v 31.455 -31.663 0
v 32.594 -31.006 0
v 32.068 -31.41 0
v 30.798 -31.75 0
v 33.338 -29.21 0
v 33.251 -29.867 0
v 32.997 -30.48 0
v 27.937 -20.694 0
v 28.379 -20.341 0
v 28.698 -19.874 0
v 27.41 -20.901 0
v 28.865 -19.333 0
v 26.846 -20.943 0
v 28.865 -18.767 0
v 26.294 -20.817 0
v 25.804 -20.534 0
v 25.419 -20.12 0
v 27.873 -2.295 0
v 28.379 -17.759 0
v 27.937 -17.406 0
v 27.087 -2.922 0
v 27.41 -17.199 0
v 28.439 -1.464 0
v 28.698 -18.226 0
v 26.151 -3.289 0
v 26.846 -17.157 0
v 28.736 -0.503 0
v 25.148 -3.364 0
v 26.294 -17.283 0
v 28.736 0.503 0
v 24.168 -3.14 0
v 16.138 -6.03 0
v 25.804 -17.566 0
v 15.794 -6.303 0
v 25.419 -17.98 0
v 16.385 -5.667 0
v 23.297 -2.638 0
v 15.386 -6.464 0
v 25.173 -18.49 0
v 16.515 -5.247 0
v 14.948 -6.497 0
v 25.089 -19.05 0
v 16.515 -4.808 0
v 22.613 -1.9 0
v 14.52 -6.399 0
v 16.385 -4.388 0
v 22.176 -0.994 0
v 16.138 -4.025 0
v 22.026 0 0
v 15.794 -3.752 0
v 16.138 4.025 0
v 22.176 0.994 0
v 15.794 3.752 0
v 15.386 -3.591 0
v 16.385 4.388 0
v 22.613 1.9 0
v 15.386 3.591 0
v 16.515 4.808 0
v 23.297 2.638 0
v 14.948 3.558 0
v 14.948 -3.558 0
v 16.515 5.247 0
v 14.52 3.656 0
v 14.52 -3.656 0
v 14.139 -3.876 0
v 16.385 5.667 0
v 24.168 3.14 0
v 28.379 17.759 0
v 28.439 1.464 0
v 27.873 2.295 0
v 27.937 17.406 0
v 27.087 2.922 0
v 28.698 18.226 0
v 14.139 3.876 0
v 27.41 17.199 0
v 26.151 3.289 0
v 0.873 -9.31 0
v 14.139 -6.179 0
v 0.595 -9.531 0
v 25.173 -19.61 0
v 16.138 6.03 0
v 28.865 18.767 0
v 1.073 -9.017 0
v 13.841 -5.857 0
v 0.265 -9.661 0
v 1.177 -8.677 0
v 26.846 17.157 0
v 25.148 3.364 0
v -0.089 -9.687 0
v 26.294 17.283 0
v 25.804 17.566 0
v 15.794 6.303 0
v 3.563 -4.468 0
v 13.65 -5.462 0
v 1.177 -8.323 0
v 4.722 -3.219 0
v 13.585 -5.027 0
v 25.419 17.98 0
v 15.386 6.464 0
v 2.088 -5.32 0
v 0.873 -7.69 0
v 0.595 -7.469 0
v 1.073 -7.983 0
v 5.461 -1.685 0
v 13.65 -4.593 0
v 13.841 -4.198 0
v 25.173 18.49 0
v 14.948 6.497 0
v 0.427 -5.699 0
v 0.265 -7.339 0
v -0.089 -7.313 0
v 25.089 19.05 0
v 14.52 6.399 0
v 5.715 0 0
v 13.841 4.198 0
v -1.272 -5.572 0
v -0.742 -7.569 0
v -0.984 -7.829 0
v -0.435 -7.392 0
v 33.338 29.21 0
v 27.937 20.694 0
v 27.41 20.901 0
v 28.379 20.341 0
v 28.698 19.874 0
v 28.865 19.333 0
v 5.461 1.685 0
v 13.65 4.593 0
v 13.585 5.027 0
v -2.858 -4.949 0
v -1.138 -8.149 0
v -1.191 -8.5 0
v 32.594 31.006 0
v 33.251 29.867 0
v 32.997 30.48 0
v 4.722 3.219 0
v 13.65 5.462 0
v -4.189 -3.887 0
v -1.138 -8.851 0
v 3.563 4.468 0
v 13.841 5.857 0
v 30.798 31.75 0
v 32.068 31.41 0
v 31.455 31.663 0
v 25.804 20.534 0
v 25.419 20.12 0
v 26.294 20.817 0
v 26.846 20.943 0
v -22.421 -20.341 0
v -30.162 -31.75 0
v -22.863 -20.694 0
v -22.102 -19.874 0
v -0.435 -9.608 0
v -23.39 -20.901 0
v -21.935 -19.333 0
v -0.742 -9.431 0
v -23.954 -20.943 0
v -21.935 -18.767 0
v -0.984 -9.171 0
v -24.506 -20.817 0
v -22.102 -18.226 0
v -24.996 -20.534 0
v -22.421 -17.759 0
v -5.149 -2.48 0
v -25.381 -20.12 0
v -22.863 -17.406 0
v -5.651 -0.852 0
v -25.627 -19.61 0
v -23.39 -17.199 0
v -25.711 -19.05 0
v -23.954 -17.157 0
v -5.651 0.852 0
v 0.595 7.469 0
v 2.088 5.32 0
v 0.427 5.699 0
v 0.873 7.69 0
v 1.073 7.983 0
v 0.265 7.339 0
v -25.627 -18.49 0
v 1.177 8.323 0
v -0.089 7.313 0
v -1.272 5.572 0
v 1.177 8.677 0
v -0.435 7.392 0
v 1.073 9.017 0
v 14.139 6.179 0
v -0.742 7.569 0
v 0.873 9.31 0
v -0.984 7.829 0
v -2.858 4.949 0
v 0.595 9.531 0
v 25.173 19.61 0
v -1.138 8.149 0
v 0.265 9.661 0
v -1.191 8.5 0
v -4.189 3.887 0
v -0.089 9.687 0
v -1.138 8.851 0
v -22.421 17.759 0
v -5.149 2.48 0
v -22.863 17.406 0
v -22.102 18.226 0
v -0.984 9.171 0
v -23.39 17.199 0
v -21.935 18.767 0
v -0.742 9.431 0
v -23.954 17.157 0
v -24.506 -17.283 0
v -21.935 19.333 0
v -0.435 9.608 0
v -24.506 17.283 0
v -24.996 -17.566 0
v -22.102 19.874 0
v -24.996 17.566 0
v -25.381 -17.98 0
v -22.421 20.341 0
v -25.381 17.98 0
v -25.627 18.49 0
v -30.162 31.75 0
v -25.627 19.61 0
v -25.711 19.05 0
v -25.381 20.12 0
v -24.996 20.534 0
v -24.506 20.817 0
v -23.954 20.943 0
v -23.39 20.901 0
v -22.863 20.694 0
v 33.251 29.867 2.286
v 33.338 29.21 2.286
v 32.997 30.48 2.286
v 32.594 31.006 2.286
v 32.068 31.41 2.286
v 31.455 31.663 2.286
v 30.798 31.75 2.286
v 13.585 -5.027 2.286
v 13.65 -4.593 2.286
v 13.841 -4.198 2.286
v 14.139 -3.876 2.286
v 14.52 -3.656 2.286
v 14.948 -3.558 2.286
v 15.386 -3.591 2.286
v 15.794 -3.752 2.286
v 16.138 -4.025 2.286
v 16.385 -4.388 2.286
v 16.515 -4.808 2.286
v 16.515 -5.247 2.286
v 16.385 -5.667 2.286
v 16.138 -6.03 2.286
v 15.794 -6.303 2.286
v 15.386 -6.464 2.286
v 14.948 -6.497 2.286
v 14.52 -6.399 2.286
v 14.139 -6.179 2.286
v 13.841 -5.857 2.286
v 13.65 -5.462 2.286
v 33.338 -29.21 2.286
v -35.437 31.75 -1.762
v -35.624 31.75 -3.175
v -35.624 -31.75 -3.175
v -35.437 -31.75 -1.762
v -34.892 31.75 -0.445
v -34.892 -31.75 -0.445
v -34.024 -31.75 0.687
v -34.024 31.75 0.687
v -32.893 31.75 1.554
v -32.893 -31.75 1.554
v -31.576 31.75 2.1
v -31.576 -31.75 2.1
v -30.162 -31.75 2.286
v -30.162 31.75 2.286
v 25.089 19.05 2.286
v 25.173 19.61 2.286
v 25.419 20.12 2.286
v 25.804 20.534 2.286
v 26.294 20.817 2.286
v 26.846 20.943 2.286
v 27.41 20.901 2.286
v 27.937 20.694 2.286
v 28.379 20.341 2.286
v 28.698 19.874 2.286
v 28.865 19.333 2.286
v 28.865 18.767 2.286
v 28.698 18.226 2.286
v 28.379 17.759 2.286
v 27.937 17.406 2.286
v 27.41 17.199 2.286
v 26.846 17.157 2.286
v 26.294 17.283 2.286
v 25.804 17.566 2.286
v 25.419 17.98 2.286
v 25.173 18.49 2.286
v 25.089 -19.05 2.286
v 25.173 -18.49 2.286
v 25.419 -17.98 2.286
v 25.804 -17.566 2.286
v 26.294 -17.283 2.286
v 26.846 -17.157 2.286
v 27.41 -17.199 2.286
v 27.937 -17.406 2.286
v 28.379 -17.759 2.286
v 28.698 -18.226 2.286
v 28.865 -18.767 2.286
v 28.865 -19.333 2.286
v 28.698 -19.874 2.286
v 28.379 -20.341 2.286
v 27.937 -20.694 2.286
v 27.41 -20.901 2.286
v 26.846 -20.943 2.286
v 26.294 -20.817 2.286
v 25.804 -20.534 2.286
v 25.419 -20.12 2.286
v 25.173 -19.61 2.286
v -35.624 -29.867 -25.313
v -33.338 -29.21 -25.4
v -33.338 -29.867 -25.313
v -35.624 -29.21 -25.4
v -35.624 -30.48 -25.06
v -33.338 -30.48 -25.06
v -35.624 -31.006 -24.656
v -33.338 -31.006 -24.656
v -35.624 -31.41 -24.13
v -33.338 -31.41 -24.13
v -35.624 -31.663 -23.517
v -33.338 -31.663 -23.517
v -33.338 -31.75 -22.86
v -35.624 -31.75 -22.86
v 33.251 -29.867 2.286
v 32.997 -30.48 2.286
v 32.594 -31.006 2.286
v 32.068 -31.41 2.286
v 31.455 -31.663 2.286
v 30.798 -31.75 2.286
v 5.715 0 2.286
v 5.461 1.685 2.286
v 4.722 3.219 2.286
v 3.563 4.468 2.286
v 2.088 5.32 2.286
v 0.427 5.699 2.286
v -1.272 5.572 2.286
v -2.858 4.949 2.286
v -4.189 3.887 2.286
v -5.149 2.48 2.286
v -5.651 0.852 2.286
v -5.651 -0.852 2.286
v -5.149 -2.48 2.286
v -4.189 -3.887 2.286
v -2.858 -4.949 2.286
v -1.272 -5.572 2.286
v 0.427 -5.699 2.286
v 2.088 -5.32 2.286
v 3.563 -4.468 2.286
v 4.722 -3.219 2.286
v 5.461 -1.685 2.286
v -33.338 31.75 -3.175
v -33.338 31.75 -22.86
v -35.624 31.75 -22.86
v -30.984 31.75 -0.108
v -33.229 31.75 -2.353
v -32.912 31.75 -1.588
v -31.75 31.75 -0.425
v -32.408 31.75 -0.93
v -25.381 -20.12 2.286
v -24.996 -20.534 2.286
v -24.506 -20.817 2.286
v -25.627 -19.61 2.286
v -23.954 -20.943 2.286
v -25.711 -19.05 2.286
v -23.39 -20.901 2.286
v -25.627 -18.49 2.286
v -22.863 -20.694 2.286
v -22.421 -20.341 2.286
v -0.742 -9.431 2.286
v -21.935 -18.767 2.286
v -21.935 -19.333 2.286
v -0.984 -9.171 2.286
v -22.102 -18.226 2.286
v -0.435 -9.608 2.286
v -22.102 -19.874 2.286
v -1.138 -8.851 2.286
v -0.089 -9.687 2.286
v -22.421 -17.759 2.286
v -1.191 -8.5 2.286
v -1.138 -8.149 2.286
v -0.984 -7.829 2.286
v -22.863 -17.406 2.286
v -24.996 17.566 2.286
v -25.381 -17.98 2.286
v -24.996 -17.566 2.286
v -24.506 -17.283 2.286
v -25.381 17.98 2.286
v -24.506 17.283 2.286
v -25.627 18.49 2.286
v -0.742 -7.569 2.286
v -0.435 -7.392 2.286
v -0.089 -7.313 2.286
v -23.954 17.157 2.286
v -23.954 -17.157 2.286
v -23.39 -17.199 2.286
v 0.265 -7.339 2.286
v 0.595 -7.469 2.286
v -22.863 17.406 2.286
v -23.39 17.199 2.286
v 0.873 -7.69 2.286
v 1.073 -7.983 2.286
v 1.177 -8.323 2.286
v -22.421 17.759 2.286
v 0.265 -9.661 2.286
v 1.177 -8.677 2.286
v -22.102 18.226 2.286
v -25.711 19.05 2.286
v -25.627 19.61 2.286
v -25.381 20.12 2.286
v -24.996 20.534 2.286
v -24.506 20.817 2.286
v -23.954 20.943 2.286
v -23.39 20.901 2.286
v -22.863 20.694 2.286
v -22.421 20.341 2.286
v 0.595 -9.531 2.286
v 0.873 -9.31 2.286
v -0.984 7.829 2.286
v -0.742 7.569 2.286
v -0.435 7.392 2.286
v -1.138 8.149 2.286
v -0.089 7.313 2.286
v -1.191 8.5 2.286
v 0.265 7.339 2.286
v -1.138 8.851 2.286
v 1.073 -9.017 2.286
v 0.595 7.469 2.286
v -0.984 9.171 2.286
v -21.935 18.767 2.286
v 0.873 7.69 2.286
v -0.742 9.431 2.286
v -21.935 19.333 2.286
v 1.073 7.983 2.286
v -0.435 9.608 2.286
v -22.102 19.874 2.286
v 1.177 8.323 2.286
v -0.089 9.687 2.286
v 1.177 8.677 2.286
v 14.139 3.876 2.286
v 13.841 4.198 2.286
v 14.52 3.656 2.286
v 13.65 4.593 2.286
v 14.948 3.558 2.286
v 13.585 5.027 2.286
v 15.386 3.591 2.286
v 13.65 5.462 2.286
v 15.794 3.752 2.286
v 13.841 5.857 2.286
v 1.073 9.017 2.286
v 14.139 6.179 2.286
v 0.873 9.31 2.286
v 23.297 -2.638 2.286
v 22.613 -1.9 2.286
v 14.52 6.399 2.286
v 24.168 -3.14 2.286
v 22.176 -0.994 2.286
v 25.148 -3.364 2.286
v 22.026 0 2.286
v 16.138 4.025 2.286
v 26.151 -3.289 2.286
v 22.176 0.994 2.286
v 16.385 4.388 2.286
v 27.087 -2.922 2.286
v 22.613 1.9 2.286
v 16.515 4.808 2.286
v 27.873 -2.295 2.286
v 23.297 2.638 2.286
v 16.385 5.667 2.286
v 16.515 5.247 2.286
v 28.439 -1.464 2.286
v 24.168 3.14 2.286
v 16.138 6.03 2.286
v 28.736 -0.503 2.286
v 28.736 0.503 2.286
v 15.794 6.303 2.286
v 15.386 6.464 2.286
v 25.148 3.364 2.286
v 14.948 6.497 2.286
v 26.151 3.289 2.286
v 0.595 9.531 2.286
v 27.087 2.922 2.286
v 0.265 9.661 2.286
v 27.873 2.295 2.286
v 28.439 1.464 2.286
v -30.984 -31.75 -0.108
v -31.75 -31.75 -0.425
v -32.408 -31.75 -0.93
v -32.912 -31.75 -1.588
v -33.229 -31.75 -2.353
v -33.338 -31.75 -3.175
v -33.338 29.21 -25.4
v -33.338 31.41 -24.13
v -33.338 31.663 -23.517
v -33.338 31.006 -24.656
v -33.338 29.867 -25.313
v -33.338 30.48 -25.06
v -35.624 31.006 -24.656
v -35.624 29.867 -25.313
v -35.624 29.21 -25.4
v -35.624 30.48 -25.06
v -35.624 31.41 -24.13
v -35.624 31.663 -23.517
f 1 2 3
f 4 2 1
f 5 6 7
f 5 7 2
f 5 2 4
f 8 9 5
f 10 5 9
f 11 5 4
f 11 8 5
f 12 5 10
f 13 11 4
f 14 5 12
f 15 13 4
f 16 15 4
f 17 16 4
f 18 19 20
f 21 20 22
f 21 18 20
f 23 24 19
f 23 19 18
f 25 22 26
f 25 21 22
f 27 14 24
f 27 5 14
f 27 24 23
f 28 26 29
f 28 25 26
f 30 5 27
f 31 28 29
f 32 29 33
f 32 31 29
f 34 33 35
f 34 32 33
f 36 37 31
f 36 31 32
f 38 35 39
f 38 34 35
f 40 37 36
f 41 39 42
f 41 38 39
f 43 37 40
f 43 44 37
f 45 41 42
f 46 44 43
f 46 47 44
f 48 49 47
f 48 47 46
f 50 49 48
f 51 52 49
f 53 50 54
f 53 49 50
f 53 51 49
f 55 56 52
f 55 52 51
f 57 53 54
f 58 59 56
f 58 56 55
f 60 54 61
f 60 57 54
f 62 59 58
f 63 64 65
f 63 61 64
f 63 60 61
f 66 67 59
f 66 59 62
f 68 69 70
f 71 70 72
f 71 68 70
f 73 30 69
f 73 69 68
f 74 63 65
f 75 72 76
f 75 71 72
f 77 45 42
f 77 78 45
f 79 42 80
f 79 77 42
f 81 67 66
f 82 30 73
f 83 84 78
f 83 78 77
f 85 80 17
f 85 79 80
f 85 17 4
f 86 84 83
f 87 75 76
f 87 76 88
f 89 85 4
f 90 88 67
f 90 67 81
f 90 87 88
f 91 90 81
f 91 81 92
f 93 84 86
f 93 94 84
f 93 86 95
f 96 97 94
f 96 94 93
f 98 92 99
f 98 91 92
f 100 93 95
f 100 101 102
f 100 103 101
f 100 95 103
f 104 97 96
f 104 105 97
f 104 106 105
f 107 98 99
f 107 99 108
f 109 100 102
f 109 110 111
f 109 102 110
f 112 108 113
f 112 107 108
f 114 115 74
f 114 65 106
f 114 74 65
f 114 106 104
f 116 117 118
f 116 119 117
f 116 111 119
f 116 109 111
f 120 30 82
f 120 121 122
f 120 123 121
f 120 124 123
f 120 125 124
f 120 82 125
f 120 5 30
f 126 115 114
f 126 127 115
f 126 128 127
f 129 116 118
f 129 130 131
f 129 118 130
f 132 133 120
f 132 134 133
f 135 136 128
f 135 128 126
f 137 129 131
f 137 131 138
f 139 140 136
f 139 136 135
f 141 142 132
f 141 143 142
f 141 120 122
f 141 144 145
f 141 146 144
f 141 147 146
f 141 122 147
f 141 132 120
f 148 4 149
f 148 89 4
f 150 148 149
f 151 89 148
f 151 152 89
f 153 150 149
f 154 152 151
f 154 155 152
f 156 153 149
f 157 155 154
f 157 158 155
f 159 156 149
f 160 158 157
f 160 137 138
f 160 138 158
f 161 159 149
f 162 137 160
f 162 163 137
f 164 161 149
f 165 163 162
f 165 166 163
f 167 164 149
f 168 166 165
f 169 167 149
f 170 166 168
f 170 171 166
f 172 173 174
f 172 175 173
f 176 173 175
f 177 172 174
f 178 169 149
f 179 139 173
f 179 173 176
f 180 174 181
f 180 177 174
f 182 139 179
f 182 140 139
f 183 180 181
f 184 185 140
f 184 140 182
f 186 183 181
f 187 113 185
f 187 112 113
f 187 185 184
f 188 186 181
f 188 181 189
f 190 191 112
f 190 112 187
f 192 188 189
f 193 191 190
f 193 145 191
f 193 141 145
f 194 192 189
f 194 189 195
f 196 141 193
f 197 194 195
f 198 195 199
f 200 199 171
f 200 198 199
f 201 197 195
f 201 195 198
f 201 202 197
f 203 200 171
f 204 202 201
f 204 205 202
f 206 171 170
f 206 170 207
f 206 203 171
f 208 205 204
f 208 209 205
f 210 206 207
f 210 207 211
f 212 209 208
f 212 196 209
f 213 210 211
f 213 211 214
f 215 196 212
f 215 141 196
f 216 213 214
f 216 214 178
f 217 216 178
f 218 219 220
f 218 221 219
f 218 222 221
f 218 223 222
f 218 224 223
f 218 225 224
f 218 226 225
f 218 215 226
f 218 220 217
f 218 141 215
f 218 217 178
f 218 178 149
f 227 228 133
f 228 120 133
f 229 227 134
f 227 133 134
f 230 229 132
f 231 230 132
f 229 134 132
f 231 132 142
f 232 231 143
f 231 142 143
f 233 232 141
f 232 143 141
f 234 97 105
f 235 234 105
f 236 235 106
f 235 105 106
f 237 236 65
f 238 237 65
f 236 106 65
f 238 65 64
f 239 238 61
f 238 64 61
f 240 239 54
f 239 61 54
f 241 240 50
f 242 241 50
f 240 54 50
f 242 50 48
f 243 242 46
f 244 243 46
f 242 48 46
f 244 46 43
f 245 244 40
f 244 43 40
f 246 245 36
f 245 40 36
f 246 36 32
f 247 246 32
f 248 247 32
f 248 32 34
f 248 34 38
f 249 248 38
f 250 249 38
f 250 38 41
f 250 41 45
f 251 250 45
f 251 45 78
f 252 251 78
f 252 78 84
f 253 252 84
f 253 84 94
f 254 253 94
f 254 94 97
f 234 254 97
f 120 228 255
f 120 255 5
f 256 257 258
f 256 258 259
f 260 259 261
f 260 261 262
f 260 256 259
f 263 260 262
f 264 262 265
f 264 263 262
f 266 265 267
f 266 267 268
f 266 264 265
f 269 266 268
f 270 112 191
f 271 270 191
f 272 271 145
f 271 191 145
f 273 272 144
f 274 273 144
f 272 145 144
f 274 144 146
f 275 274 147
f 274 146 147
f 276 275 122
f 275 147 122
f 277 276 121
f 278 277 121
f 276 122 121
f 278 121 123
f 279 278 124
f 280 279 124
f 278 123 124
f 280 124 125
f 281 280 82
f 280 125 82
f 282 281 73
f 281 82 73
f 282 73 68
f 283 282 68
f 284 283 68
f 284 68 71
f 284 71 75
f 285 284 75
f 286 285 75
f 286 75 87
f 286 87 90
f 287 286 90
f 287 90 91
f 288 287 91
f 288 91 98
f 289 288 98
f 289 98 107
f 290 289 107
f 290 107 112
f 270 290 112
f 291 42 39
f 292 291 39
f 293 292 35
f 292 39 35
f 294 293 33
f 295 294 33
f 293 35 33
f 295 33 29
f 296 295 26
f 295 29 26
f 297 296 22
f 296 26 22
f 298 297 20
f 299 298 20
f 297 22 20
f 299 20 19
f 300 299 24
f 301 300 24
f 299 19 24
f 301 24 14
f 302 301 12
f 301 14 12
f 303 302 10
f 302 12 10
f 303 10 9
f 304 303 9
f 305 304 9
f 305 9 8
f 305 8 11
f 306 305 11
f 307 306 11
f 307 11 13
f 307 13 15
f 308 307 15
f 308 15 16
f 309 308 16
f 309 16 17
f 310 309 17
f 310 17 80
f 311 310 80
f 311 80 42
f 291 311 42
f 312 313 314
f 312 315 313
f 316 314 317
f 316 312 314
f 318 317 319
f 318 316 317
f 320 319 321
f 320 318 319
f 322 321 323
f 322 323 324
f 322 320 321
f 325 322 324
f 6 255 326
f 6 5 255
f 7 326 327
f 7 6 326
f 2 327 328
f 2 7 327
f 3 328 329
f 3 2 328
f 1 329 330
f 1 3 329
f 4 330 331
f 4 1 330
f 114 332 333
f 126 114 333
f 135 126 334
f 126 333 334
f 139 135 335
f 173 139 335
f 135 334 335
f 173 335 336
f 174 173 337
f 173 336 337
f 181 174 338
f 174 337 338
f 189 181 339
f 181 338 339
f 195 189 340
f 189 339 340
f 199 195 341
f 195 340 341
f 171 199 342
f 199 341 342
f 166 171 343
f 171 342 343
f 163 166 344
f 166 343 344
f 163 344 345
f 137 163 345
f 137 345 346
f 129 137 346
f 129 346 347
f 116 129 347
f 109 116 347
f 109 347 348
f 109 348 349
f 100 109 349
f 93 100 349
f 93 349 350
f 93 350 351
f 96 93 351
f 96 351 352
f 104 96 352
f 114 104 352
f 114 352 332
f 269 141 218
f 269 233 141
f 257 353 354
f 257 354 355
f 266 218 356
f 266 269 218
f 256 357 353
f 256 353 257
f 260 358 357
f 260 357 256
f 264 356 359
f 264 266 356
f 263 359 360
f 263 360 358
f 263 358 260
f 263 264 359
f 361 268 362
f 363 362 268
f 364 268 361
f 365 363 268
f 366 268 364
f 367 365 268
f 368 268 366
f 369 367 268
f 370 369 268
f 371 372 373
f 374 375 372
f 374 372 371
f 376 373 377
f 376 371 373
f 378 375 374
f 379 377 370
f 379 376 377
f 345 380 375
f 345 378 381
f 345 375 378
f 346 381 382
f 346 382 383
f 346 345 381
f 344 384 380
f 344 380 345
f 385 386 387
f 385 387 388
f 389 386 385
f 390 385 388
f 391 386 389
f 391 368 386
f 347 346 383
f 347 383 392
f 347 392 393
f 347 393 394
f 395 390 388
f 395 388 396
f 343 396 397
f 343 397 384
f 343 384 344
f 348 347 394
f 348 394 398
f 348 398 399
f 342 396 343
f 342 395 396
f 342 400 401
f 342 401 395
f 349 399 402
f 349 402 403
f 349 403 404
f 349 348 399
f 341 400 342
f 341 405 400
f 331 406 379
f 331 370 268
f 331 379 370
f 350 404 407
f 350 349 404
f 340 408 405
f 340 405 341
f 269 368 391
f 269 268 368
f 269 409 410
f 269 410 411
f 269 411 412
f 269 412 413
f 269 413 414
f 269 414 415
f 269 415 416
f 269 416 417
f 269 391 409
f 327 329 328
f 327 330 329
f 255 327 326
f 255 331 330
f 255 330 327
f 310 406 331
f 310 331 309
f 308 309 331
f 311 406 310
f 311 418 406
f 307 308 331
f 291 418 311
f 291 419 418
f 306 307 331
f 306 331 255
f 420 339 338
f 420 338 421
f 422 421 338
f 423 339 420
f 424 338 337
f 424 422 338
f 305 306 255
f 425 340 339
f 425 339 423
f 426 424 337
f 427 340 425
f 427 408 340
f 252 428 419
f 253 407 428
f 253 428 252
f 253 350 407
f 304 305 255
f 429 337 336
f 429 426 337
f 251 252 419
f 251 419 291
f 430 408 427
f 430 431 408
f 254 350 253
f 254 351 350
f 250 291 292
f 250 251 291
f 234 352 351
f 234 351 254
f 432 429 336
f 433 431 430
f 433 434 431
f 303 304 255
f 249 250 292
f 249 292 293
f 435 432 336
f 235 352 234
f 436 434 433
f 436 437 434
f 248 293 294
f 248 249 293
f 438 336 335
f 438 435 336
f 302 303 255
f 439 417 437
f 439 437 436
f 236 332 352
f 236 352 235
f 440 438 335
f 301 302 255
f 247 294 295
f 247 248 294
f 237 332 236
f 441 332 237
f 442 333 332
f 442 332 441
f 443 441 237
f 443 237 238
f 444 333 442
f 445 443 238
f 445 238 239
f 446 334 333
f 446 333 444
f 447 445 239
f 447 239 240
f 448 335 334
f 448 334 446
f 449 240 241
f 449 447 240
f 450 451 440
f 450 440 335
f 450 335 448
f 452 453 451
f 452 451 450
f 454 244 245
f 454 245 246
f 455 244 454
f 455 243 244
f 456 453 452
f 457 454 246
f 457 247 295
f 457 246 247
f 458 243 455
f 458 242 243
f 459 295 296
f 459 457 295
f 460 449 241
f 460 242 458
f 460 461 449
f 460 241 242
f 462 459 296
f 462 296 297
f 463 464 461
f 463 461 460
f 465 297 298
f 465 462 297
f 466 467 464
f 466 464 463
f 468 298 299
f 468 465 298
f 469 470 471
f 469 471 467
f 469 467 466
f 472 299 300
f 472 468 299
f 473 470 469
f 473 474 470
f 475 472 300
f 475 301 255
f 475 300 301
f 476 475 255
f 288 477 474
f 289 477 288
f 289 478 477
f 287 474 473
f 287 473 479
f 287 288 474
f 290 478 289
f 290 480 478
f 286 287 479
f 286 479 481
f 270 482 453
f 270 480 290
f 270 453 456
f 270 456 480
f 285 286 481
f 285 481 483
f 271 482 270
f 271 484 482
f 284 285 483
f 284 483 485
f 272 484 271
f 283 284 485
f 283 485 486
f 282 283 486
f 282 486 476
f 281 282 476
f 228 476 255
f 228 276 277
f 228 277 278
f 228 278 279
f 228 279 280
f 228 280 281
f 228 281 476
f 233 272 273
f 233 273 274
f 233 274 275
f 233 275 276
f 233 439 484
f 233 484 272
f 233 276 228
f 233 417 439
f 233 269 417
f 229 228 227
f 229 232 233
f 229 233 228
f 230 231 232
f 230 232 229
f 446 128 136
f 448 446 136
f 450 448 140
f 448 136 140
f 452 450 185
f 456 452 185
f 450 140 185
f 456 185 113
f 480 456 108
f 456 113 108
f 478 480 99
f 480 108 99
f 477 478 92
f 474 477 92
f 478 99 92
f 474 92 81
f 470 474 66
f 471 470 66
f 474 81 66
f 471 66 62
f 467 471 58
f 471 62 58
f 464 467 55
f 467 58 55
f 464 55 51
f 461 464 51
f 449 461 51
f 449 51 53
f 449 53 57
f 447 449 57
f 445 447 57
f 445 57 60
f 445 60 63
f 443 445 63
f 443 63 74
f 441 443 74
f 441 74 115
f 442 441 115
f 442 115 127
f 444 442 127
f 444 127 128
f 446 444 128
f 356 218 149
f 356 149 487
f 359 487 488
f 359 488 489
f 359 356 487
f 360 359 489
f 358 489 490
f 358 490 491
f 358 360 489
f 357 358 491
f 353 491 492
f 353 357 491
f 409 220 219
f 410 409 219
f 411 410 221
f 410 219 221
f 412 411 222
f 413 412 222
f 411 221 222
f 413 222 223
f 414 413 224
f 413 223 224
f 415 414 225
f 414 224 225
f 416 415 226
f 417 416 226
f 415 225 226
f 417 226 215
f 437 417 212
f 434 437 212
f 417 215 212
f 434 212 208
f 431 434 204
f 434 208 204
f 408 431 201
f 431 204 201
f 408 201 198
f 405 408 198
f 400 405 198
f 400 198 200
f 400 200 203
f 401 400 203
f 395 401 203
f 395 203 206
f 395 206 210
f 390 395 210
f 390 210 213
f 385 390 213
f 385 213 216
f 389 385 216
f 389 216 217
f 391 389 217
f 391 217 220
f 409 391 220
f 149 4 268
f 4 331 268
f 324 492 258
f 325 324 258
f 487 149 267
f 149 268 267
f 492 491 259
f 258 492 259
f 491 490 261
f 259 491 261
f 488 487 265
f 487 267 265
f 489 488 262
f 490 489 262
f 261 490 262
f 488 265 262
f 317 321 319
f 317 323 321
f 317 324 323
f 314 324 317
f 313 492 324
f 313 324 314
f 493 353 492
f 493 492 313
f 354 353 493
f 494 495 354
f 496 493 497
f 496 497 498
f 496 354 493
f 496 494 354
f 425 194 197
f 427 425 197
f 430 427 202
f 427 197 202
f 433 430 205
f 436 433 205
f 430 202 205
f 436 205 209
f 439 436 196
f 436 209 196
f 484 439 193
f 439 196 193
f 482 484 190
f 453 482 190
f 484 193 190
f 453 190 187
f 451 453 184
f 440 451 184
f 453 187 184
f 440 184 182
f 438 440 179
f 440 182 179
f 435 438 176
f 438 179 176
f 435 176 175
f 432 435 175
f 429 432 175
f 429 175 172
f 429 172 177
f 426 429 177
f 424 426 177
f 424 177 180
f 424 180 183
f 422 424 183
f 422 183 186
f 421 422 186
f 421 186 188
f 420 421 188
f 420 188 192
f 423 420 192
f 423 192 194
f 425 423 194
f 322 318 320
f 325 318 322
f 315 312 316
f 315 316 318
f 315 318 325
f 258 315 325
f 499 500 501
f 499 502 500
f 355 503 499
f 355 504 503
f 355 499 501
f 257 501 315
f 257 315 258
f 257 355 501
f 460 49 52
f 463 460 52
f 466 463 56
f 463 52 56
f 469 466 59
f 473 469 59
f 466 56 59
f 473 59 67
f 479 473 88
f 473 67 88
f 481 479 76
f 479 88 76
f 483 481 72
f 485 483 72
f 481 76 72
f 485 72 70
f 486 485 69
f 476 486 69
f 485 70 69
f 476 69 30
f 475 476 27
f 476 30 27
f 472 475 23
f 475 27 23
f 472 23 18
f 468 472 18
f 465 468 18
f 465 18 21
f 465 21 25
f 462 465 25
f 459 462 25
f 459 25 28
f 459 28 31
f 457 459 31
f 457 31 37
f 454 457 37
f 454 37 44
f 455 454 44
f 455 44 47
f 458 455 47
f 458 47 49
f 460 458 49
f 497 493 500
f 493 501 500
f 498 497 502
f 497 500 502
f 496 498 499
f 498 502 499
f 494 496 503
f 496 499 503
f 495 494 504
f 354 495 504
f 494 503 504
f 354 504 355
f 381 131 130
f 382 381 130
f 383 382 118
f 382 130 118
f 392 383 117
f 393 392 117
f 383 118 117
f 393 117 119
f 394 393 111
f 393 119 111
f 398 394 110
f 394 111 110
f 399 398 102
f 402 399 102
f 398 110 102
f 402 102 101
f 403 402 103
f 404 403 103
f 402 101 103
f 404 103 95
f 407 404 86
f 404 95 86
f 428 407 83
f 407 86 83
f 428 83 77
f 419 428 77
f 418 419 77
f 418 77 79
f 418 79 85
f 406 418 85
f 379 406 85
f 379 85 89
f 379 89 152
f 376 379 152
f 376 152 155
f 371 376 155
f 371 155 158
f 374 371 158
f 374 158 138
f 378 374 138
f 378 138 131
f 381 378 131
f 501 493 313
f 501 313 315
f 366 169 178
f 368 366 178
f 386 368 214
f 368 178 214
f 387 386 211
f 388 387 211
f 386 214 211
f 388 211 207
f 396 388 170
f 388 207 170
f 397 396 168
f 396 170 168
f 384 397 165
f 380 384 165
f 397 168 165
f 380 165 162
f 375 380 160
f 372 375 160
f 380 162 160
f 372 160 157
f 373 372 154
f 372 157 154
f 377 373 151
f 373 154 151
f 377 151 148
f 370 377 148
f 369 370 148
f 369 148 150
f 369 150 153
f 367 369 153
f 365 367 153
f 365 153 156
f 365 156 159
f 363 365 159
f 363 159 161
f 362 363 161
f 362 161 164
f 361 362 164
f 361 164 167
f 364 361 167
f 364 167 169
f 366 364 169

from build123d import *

# Parameters (mm, degrees)
BASE_FLANGE1_DEPTH               = 31.75
FILLET1_R                        = 2.54
F_25_0_1495_DIAMETER_HOLE1_D     = 3.7973
SKETCH10_R                       = 5.715
CUT_EXTRUDE1_DEPTH               = 56.168930099
F_17_64_0_26563_DIAMETER_HOLE1_D = 6.747002
F_3_32_0_09375_DIAMETER_HOLE1_D  = 2.38125
F_32_0_116_DIAMETER_HOLE1_D      = 2.9464


# Sheet-metal steps are written as plain solids
with BuildPart() as part:
    # Sketch3 → Base-Flange1 (new, symmetric)
    with BuildSketch(Plane(origin=(0, 0, 0), x_dir=(-1, 0, 0), z_dir=(0, 1, 0))):
        with BuildLine():
            Line((-33.3375, 0), (30.1625, 0))
            ThreePointArc((30.1625, 0), (32.40756403, -0.92993597), (33.3375, -3.175))
            Line((33.3375, -3.175), (33.3375, -25.4))
            Line((33.3375, -25.4), (35.6235, -25.4))
            Line((35.6235, -25.4), (35.6235, -3.175))
            ThreePointArc((35.6235, -3.175), (34.024010132, 0.686510132), (30.1625, 2.286))
            Line((30.1625, 2.286), (-33.3375, 2.286))
            Line((-33.3375, 2.286), (-33.3375, 0))
        make_face()
    extrude(amount=BASE_FLANGE1_DEPTH, both=True)

    # Fillet1
    fillet1_edges = [part.edges().sort_by_distance(p)[0] for p in [
        (33.3375, 31.75, 1.143),
        (33.3375, -31.75, 1.143),
        (-34.4805, 31.75, -25.4),
        (-34.4805, -31.75, -25.4),
    ]]
    fillet(fillet1_edges, radius=FILLET1_R)

    # #25 (0.1495) Diameter Hole1 (through all)
    with Locations(Plane.XY.offset(2.286)):
        with Locations((-23.8125, 19.05), (26.9875, 19.05), (26.9875, -19.05), (-23.8125, -19.05)):
            Hole(F_25_0_1495_DIAMETER_HOLE1_D / 2)

    # Sketch10 → Cut-Extrude1 (cut, through all)
    with BuildSketch(Plane.XY.offset(2.286)):
        Circle(SKETCH10_R)
    extrude(amount=-CUT_EXTRUDE1_DEPTH, mode=Mode.SUBTRACT)

    # 17/64 (0.26563) Diameter Hole1 (through all)
    with Locations(Plane.XY.offset(2.286)):
        with Locations((25.4, 0)):
            Hole(F_17_64_0_26563_DIAMETER_HOLE1_D / 2)

    # 3/32 (0.09375) Diameter Hole1 (through all)
    with Locations(Plane.XY.offset(2.286)):
        with Locations((0, 8.5), (0, -8.5)):
            Hole(F_3_32_0_09375_DIAMETER_HOLE1_D / 2)

    # #32 (0.116) Diameter Hole1 (through all)
    with Locations(Plane.XY.offset(2.286)):
        with Locations((15.057884182, 5.027499276), (15.057884182, -5.027499276)):
            Hole(F_32_0_116_DIAMETER_HOLE1_D / 2)


solid = part.part
